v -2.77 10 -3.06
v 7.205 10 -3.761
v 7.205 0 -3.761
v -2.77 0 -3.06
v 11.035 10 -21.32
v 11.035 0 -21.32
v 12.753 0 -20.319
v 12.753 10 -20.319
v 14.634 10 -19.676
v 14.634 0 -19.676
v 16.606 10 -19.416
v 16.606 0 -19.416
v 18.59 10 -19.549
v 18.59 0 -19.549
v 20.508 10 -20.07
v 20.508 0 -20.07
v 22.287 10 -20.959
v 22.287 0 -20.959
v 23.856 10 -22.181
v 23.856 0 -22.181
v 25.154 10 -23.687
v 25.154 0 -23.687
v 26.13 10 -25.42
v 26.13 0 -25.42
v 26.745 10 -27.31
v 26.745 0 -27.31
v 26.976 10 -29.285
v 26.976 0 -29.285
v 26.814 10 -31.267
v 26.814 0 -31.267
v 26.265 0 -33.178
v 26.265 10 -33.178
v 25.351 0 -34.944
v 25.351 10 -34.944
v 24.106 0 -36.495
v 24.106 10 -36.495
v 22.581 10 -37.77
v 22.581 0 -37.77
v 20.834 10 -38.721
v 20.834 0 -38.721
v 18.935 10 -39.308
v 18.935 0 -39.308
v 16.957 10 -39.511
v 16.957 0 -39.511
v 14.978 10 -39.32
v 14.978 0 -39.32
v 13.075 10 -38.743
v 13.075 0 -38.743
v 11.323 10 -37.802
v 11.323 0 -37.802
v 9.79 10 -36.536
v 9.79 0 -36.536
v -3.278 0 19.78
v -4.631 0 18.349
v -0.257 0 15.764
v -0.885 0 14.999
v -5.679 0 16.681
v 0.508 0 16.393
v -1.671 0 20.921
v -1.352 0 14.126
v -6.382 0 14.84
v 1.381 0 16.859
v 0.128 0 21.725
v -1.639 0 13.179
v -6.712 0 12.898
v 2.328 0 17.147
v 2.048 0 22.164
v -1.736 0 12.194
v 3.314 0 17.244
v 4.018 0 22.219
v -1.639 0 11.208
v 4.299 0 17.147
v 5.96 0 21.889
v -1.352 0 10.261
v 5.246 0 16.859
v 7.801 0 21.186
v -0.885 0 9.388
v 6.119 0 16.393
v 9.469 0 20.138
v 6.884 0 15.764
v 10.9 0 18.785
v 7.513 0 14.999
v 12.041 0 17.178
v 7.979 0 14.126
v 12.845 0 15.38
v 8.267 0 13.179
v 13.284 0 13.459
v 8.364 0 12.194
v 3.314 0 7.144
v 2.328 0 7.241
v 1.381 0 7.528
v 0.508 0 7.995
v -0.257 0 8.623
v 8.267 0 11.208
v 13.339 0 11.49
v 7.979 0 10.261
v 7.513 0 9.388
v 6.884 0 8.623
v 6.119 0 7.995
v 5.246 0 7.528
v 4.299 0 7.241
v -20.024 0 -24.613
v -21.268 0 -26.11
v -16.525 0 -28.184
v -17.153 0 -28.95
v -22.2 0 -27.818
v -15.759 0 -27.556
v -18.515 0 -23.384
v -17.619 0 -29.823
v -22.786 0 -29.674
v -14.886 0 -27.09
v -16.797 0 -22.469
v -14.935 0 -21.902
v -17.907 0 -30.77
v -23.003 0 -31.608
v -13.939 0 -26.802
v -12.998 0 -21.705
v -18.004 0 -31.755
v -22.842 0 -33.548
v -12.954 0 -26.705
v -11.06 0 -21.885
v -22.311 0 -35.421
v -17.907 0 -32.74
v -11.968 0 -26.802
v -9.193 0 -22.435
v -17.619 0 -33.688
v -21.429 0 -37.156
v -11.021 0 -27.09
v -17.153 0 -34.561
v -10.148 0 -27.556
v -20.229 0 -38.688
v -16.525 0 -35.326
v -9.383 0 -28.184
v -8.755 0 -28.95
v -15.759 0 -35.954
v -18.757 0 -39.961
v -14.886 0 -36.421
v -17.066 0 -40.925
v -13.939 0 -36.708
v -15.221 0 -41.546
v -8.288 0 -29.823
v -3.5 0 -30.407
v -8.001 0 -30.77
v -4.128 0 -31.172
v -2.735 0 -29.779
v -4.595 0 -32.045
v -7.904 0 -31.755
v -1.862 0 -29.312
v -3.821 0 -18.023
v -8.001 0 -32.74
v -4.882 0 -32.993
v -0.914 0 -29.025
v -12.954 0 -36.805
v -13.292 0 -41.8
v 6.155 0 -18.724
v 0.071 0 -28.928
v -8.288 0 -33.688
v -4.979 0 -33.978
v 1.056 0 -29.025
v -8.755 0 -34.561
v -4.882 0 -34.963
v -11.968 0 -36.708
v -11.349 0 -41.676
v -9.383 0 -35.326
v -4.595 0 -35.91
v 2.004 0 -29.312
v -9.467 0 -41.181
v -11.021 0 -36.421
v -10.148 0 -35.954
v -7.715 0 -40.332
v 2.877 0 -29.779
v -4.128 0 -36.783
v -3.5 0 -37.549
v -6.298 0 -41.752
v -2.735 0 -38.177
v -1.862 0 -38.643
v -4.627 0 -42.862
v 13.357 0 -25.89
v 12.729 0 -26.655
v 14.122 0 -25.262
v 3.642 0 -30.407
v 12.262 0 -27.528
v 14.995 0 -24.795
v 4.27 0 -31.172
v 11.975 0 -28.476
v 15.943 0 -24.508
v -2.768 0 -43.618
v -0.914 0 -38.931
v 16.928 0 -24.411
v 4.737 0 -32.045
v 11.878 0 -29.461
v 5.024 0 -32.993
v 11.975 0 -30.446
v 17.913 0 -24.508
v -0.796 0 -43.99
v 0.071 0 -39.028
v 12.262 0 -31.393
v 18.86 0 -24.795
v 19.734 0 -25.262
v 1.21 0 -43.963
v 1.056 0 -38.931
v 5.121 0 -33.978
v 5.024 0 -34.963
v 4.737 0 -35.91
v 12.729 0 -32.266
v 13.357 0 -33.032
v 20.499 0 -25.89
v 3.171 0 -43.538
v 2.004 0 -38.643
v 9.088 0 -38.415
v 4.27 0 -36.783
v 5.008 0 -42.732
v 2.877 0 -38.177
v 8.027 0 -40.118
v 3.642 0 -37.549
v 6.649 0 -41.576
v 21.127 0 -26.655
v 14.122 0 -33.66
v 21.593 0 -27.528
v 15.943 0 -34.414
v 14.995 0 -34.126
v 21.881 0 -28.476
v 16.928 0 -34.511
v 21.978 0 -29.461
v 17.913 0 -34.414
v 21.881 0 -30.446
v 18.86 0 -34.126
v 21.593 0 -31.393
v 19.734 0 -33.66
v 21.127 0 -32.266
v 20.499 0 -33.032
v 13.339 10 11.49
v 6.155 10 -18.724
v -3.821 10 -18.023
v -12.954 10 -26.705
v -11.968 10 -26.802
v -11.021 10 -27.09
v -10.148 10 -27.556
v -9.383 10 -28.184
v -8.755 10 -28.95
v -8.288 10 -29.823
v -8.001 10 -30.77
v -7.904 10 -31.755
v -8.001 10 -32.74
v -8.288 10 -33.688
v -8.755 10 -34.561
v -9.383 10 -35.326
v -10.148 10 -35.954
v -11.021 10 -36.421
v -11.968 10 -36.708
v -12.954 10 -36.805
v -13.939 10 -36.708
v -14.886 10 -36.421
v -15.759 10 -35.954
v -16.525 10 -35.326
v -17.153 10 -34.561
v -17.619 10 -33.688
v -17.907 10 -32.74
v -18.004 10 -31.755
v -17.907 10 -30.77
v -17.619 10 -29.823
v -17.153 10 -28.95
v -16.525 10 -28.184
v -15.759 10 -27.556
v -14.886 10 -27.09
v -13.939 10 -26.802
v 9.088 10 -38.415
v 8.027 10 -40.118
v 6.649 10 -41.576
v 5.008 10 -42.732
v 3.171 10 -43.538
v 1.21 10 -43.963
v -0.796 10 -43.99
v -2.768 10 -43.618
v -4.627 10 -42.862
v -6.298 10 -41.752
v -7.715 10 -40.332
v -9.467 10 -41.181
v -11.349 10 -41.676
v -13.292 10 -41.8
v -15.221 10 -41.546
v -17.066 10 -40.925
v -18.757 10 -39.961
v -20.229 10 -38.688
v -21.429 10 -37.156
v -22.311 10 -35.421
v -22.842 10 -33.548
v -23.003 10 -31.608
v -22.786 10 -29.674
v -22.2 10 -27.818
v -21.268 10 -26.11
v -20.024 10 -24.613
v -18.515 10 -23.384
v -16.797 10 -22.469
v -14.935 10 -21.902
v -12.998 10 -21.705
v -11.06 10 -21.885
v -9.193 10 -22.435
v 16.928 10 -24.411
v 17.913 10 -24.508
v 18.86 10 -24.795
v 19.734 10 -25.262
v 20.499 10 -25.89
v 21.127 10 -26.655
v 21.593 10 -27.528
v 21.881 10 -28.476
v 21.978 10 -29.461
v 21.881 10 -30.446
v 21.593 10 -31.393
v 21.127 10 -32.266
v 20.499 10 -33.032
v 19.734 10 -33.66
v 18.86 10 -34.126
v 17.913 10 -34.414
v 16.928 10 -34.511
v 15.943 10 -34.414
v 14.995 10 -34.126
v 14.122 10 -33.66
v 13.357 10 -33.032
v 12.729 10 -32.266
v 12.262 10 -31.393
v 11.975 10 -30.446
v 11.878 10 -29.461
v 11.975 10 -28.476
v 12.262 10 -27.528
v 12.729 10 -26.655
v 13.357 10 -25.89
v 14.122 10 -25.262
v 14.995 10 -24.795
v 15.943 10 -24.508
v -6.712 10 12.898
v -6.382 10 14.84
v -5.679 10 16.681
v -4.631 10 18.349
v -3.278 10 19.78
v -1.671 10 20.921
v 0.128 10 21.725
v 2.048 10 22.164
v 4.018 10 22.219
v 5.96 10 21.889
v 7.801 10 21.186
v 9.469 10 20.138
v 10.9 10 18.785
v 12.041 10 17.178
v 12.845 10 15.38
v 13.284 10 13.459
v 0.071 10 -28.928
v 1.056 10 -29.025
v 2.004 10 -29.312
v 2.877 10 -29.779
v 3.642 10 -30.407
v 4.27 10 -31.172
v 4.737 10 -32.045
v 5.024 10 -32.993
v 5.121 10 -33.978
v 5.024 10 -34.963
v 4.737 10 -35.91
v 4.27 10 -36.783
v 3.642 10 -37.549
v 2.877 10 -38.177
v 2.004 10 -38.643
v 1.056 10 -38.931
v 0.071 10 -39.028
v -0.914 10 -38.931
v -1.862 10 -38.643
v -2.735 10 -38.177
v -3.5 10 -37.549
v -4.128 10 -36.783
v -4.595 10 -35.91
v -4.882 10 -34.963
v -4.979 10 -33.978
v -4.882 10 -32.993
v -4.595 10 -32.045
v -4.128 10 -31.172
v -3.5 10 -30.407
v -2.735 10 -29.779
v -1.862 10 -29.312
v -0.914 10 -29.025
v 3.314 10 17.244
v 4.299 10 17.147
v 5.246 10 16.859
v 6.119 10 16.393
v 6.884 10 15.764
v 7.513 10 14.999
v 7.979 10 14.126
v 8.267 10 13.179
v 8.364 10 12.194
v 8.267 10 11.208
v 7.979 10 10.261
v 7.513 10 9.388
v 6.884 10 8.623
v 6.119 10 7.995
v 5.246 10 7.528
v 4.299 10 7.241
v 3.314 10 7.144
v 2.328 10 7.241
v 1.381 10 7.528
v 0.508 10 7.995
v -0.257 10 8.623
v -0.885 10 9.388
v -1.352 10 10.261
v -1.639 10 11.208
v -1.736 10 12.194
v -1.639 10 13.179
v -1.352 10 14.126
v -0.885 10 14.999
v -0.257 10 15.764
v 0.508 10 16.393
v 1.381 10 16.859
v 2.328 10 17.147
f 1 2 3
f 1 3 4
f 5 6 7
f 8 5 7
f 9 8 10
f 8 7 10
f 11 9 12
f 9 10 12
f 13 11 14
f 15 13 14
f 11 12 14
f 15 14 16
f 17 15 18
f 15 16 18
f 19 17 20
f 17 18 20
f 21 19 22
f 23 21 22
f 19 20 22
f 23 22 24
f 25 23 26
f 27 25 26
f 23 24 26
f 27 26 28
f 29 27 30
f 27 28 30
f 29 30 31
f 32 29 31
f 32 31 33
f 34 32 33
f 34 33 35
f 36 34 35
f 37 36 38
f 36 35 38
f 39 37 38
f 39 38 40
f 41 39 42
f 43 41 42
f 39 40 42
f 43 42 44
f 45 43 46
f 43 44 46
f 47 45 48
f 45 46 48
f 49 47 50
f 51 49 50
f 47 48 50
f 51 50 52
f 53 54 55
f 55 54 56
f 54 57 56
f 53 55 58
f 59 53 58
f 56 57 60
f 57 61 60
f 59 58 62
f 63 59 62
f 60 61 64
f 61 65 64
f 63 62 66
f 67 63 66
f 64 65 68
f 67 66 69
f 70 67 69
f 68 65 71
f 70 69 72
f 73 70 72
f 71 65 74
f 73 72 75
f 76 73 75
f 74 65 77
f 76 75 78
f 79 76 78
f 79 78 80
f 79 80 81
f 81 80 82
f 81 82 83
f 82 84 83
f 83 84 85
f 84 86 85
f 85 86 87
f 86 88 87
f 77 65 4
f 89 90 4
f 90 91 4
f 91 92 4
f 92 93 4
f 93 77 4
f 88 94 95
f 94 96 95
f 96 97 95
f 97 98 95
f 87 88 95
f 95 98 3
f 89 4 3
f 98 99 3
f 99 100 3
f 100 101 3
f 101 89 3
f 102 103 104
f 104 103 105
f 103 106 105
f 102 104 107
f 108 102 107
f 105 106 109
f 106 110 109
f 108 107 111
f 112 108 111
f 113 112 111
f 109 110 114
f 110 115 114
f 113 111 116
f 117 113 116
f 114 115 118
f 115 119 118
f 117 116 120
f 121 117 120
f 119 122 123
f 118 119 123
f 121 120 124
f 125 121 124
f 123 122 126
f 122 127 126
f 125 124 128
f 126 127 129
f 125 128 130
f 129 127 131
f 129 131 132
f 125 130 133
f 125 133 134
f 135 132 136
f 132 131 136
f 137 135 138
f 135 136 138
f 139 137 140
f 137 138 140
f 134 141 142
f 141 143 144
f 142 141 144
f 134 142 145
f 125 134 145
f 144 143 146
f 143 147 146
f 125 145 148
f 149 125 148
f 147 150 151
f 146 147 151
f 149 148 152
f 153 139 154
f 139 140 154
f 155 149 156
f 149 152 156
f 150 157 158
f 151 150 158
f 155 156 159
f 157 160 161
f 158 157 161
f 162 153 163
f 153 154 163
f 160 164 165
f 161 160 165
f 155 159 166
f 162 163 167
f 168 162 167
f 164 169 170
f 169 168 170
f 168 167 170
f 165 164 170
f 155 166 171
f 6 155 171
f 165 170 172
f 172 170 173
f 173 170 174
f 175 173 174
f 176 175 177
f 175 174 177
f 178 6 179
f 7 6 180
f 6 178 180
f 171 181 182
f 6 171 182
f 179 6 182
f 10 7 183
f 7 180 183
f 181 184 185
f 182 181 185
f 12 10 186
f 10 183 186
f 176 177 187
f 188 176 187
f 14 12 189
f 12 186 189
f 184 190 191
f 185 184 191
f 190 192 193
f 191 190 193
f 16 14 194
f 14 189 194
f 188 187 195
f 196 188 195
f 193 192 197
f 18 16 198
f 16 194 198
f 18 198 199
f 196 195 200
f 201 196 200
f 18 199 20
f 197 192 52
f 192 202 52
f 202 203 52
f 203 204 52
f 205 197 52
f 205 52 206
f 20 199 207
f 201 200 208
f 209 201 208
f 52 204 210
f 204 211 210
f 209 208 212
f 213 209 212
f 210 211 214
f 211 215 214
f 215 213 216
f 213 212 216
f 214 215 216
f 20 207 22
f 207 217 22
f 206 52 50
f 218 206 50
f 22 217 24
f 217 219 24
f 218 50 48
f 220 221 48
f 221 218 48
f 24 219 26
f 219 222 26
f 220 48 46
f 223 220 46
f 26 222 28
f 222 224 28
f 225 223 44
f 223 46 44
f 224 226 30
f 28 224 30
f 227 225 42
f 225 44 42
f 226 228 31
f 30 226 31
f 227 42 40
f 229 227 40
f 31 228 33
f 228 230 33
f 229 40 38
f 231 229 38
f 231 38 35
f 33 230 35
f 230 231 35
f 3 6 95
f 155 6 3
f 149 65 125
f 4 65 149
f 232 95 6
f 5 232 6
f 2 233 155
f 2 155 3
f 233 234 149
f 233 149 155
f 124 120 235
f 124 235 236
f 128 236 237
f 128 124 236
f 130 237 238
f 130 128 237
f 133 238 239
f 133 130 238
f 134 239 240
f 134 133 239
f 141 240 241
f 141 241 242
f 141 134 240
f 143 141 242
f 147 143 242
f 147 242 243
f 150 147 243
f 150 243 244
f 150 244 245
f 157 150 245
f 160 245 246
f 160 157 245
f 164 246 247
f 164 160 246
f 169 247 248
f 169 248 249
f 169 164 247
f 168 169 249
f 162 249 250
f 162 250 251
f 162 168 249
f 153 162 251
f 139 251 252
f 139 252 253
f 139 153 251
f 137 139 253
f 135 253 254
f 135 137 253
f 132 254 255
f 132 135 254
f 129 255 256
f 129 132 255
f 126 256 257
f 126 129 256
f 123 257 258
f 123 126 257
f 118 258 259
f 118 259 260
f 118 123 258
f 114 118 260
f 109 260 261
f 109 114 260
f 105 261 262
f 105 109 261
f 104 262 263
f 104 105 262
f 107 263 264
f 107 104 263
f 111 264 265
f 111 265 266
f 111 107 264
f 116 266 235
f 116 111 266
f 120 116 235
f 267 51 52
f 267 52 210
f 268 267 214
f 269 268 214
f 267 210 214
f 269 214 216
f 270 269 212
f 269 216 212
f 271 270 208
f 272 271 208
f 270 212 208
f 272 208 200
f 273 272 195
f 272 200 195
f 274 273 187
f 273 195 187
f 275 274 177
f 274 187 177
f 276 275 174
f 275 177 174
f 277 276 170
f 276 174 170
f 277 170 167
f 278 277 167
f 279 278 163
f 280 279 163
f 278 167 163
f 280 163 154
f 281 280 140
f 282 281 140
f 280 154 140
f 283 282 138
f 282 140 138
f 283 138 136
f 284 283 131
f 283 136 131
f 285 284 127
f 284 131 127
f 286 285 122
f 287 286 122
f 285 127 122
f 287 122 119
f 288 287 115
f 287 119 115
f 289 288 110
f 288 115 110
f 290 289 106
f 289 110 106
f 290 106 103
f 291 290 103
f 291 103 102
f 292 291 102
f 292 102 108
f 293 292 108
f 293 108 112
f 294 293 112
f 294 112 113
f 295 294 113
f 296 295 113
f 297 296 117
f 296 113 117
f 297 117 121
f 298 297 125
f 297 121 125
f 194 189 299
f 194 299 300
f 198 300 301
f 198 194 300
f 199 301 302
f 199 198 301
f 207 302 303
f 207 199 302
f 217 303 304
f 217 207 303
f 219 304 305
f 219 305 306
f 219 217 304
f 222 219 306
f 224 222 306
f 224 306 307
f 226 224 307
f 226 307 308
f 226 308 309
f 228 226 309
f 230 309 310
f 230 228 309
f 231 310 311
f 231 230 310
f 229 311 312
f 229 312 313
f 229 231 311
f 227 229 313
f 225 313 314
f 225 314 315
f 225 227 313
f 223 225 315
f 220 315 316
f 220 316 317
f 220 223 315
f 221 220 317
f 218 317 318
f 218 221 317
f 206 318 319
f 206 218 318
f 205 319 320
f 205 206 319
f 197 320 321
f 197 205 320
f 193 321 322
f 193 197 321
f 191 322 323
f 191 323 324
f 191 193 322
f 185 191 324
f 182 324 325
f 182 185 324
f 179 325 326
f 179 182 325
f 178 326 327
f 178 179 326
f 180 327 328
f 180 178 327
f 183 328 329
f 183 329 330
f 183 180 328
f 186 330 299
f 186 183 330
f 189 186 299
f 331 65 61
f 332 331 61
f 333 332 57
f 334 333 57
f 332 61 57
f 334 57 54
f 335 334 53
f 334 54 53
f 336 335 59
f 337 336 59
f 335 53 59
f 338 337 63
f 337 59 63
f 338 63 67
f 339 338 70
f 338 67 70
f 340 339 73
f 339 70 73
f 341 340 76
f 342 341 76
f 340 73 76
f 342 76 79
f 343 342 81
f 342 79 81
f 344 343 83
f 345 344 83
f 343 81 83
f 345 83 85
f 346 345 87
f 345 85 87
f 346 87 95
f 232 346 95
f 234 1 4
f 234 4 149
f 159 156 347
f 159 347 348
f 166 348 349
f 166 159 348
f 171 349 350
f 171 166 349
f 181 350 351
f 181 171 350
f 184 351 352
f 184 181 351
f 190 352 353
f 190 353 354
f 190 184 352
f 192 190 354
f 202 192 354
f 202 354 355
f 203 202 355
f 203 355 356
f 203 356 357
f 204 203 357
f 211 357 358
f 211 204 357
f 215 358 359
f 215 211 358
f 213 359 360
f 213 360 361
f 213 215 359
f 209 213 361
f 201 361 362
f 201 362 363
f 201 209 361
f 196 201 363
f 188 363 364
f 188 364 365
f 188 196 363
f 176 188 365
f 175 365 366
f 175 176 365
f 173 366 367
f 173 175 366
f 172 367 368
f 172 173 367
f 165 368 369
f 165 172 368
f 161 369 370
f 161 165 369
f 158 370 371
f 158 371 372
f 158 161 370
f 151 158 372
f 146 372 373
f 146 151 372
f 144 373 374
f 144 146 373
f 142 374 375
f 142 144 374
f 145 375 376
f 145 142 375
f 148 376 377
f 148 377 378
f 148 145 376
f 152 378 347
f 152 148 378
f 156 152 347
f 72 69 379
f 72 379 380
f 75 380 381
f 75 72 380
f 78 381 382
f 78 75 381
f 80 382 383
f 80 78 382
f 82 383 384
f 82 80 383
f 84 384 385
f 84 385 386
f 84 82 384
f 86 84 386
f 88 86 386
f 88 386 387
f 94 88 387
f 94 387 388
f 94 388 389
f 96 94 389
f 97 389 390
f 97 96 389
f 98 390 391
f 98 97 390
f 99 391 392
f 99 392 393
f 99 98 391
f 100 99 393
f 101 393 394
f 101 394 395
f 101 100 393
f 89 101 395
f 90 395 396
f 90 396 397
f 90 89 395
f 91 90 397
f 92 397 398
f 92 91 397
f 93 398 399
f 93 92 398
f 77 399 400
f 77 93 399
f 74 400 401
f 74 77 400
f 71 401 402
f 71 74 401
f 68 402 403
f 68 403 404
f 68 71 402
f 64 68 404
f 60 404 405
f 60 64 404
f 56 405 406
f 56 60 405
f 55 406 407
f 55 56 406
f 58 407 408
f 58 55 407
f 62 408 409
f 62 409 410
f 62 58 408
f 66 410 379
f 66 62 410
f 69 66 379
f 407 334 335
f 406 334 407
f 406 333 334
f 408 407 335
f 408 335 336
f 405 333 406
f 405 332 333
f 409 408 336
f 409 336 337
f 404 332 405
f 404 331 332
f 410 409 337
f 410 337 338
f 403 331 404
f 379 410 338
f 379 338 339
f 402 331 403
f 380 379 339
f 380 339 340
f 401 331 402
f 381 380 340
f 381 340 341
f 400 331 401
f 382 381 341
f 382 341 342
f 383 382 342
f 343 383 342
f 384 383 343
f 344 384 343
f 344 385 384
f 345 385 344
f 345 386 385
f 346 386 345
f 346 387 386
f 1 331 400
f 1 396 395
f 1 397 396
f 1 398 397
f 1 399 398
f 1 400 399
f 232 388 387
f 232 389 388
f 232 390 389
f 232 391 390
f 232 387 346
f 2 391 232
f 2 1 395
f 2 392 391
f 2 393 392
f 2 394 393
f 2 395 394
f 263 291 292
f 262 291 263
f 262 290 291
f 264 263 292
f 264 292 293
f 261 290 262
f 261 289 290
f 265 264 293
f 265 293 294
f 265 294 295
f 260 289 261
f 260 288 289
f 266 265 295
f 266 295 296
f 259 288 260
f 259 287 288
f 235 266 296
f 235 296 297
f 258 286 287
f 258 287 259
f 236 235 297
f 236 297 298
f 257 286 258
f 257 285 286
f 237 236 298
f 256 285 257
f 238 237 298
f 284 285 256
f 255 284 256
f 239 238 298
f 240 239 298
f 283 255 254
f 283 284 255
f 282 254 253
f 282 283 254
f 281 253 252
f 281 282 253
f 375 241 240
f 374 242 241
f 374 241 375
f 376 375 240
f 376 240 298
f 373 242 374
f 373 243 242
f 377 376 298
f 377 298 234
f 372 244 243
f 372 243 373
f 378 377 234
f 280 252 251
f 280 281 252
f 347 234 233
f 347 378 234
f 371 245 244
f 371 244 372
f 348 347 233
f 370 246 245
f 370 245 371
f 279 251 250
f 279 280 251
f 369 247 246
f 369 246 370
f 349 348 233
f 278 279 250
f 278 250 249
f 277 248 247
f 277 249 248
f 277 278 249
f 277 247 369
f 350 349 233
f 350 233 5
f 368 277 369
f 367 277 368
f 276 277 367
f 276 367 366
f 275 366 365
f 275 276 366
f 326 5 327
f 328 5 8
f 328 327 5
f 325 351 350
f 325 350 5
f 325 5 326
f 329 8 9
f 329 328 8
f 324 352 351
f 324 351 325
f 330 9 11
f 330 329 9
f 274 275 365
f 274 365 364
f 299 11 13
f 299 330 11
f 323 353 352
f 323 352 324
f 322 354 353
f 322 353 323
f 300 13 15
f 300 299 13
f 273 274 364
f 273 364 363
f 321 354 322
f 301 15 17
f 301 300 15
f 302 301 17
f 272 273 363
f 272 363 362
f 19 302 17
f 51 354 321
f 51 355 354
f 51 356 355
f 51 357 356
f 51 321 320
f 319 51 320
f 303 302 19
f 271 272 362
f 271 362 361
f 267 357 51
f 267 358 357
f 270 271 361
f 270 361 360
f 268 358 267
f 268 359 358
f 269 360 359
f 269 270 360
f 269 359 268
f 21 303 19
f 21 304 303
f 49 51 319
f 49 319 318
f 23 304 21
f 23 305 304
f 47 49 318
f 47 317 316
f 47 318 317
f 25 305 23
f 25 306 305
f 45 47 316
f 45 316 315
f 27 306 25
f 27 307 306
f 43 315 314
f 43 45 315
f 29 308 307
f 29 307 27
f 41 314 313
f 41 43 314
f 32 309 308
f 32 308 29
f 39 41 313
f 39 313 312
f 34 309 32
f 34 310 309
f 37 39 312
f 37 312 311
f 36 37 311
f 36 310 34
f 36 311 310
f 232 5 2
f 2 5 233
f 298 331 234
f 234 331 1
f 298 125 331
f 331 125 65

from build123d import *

# Parameters (mm, degrees)
SKETCH1_R           = 5.05
BOSS_EXTRUDE1_DEPTH = 10
CUT_EXTRUDE1_DEPTH  = 10


with BuildPart() as part:
    # Sketch1 → Boss-Extrude1 (new body)
    with BuildSketch(Plane(origin=(0, 0, 0), x_dir=(1, 0, 0), z_dir=(0, 1, 0))):
        with BuildLine():
            Line((13.338907001, -11.489526472), (11.034706991, 21.319990694))
            ThreePointArc((11.034706991, 21.319990694), (26.944443341, 30.280165305), (9.790047406, 36.535654086))
            ThreePointArc((9.790047406, 36.535654086), (2.201013528, 43.799487348), (-7.715302177, 40.332011077))
            ThreePointArc((-7.715302177, 40.332011077), (-22.969610395, 32.582266479), (-9.193128161, 22.435296597))
            Line((-9.193128161, 22.435296597), (-6.711707001, -12.897673528))
            ThreePointArc((-6.711707001, -12.897673528), (4.017673528, -22.218907001), (13.338907001, -11.489526472))
        make_face()
        with Locations(Location((3.3136, -12.1936, 0), (0, 0, 270))):
            Circle(SKETCH1_R, mode=Mode.SUBTRACT)
        with Locations(Location((-12.9537, 31.7552, 0), (0, 0, 270))):
            Circle(SKETCH1_R, mode=Mode.SUBTRACT)
        with Locations(Location((0.071, 33.9778, 0), (0, 0, 270))):
            Circle(SKETCH1_R, mode=Mode.SUBTRACT)
        with Locations(Location((16.9279, 29.4608, 0), (0, 0, 270))):
            Circle(SKETCH1_R, mode=Mode.SUBTRACT)
    extrude(amount=BOSS_EXTRUDE1_DEPTH)

    # Sketch2 → Cut-Extrude1 (cut)
    with BuildSketch(Plane(origin=(0, 10, 0), x_dir=(1, 0, 0), z_dir=(0, 1, 0))):
        Polygon((-3.820842932, 18.023387052), (6.15458692, 18.723957726), (7.205442932, 3.760812948), (-2.76998692, 3.060242274), align=None)
    extrude(amount=-CUT_EXTRUDE1_DEPTH, mode=Mode.SUBTRACT)


solid = part.part
